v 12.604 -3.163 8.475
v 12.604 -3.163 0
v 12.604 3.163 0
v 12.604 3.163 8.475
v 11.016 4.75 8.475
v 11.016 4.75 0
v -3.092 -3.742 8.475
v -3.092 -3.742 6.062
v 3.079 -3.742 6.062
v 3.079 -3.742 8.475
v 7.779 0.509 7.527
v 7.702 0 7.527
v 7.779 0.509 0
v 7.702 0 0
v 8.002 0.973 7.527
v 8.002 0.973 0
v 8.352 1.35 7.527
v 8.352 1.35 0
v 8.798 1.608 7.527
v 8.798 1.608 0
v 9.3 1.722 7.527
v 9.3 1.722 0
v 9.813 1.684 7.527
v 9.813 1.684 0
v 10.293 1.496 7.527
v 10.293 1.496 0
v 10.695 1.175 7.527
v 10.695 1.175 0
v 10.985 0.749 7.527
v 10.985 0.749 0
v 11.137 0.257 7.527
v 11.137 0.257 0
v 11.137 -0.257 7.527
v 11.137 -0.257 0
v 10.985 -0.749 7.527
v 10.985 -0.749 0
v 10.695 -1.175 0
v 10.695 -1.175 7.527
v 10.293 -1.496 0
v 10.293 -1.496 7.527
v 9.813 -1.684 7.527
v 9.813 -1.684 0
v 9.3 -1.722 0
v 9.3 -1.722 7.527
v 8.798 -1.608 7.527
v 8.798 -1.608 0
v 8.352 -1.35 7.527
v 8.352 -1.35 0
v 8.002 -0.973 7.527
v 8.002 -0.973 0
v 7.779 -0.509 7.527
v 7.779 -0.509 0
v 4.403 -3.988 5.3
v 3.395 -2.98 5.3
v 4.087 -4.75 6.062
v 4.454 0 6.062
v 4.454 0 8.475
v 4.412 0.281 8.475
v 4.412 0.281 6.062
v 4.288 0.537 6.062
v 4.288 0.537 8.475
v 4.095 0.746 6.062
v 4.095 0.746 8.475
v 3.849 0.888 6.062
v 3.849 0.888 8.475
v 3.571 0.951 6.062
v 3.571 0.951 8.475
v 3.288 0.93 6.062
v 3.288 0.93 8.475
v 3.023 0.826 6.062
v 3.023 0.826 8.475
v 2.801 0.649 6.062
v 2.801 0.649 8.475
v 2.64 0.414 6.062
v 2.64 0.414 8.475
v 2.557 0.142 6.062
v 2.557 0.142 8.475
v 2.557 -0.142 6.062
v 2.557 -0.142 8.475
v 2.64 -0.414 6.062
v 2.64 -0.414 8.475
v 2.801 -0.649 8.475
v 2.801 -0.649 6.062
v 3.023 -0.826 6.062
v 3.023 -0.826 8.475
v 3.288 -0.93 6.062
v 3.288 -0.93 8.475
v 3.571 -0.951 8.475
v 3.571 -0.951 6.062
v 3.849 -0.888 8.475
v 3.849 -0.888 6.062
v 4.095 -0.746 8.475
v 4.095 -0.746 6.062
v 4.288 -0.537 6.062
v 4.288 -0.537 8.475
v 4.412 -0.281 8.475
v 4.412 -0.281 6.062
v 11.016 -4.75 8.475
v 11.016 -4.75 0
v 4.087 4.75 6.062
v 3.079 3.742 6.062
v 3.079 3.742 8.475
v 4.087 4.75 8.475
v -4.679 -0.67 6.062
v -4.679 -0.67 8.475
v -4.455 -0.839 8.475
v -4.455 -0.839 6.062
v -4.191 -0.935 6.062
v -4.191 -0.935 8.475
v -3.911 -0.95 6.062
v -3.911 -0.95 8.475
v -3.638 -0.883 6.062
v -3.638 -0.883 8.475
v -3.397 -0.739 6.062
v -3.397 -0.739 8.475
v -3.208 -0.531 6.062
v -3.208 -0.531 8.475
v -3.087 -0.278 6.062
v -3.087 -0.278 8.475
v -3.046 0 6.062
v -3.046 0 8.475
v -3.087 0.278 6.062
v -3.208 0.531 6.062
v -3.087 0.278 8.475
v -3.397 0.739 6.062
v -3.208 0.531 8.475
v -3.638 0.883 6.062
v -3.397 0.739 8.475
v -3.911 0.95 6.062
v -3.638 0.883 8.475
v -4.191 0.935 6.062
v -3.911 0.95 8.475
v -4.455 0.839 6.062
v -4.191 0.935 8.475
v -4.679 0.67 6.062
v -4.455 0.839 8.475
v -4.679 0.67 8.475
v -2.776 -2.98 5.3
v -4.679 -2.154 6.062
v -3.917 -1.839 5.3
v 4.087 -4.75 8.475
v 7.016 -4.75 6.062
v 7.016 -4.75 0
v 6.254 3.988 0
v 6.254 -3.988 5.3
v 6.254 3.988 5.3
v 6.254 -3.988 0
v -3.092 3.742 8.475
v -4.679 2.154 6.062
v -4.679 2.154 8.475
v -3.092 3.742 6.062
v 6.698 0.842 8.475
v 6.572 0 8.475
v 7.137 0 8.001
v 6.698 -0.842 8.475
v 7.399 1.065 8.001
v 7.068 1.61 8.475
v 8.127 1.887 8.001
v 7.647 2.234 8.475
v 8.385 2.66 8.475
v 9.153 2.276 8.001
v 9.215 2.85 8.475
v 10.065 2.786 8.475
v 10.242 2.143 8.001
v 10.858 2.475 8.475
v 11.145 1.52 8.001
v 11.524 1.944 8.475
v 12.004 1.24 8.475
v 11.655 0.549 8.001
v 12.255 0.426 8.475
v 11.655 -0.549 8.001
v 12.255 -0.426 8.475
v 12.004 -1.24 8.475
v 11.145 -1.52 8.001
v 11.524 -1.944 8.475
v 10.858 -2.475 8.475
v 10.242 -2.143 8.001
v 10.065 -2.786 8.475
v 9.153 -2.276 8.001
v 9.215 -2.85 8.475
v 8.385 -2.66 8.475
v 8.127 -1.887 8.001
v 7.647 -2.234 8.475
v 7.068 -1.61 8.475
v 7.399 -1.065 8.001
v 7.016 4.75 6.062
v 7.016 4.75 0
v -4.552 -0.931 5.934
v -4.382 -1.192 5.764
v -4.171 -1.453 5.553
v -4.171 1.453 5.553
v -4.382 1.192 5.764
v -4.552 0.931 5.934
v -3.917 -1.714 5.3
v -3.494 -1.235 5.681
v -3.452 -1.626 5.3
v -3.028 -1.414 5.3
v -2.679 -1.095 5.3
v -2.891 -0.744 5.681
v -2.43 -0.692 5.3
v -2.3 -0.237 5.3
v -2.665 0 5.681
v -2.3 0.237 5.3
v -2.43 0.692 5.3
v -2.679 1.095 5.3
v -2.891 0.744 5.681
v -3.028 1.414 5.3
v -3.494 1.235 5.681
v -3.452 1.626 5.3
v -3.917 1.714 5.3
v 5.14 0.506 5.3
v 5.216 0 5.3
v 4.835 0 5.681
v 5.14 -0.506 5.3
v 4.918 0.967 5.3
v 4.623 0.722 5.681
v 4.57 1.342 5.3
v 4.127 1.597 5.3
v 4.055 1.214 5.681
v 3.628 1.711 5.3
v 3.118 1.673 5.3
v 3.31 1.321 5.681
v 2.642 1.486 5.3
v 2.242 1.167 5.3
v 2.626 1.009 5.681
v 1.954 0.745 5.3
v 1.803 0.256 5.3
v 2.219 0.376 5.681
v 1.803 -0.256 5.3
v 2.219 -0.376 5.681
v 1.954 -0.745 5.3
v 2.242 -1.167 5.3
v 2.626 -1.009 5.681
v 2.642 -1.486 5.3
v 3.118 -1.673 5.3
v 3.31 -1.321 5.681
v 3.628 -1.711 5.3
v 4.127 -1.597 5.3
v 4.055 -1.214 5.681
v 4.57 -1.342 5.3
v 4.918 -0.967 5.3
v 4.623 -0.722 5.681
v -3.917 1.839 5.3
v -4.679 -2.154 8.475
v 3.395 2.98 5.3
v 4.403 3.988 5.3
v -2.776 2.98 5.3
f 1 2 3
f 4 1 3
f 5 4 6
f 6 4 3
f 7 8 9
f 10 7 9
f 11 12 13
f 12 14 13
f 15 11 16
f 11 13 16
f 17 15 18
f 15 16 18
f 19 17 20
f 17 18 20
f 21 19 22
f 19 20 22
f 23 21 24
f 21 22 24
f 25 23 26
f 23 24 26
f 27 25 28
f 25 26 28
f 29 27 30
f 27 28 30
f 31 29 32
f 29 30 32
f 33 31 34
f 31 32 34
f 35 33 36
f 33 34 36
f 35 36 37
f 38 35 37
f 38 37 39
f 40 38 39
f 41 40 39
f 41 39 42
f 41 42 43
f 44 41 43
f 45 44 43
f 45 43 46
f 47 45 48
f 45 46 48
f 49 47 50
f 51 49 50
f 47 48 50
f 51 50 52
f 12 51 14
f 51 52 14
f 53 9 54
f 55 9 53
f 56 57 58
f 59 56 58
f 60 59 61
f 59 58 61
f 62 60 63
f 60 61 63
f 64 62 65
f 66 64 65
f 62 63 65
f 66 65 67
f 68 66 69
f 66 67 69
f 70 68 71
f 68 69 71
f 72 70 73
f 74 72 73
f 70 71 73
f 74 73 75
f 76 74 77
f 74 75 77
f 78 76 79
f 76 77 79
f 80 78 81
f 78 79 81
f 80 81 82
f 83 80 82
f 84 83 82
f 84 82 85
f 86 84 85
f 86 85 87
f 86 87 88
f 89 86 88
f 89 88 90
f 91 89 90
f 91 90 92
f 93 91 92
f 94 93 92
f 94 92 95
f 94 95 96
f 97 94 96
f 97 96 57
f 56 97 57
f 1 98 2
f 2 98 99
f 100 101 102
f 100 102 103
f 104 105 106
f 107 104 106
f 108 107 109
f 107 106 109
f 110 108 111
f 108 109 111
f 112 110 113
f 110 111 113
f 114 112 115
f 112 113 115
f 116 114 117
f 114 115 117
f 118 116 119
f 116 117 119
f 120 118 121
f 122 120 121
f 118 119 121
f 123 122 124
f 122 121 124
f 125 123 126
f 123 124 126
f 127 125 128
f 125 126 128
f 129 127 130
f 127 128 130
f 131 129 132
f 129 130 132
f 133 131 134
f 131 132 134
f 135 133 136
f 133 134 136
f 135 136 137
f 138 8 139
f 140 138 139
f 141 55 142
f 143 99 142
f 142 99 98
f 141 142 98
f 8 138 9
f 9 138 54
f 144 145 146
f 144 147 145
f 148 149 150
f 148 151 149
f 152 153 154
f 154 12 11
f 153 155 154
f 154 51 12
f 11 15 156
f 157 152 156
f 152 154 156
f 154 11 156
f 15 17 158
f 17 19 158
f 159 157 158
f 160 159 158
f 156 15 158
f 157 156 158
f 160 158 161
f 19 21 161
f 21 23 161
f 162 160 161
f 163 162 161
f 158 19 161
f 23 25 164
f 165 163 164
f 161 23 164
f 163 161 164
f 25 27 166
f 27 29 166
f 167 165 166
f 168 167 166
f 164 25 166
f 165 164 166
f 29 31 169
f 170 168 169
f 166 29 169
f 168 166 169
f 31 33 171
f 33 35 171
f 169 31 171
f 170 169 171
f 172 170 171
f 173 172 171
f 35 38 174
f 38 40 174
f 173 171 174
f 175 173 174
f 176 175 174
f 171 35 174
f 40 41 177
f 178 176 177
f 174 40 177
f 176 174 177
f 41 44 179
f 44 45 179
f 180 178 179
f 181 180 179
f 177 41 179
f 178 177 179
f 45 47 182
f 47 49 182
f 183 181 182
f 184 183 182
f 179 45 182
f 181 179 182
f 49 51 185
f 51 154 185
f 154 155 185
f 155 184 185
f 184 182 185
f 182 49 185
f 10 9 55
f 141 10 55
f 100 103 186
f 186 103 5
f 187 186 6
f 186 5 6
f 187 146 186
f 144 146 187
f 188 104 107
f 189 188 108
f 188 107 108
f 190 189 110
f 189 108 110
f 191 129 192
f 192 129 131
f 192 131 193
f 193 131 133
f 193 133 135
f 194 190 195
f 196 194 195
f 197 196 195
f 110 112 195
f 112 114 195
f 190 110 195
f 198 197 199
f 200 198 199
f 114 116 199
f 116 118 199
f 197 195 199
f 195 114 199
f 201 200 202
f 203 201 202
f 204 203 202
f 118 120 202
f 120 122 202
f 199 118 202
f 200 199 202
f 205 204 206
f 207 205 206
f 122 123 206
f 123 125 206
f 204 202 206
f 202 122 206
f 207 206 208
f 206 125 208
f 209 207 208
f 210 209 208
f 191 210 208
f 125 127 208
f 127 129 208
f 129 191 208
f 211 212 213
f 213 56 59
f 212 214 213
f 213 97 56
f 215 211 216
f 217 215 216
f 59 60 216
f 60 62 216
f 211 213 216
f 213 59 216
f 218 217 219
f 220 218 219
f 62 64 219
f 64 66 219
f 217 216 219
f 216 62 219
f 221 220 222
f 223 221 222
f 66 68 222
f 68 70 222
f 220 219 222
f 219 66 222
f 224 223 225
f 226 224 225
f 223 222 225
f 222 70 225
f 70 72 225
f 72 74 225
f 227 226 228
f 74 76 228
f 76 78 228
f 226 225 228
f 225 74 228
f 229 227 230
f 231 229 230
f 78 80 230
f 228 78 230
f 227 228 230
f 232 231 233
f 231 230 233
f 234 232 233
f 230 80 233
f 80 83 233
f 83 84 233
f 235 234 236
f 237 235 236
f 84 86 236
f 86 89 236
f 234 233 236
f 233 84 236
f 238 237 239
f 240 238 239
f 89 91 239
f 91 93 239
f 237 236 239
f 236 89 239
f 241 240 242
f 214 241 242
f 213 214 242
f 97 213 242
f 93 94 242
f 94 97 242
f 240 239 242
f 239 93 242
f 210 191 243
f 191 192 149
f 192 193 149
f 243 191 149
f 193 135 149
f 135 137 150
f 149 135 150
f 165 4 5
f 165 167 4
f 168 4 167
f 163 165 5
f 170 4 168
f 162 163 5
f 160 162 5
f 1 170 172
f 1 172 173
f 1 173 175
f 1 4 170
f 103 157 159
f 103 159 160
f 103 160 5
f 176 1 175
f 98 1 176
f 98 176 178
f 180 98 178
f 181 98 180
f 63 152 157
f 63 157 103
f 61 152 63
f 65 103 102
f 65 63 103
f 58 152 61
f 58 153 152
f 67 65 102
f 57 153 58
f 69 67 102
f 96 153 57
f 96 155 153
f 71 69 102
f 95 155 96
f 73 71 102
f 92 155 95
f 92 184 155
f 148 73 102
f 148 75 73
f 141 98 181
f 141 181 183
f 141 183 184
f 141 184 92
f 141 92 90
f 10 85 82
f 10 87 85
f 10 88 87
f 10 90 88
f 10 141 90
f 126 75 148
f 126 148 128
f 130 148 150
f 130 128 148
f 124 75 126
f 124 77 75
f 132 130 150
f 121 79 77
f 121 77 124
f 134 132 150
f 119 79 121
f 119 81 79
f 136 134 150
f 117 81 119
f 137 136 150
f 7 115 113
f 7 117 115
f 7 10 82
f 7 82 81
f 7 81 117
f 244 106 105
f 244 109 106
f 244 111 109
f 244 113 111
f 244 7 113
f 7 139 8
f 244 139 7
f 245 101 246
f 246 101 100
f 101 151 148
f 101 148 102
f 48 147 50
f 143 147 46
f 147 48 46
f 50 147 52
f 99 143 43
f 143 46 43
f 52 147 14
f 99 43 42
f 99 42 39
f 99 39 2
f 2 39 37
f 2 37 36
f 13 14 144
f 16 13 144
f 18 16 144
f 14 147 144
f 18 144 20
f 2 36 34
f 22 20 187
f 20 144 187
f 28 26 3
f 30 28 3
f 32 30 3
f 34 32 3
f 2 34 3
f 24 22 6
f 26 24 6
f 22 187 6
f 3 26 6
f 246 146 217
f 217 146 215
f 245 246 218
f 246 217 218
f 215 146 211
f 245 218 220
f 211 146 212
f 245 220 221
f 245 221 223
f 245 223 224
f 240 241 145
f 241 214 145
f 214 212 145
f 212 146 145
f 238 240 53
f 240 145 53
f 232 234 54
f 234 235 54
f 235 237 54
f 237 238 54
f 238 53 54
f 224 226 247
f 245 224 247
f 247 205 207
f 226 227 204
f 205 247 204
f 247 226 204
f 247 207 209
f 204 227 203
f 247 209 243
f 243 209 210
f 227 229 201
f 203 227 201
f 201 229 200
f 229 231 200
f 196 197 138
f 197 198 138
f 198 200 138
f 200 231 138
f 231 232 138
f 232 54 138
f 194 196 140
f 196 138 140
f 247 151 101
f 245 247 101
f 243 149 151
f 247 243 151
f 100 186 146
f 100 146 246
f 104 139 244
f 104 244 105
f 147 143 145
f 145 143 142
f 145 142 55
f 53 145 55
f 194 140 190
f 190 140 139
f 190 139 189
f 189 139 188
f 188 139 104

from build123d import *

# Parameters (mm, degrees)
SKETCH1_W                                         = 6.35
SKETCH1_H                                         = 9.5
BOSS_EXTRUDE1_DEPTH                               = 5.3
SKETCH2_W                                         = 17.283420288
SKETCH2_H                                         = 7.484
BOSS_EXTRUDE2_DEPTH                               = 3.175
SKETCH3_R                                         = 0.954
CUT_EXTRUDE1_DEPTH                                = 16.91379719
SKETCH4_W                                         = 6.35
SKETCH4_H                                         = 1.008
BOSS_EXTRUDE3_DEPTH                               = 3.175
CHAMFER1_SIZE                                     = 3.175
CHAMFER2_SIZE                                     = 1.5875
CHAMFER3_SIZE                                     = 0.762
CSK_FOR_4_FLAT_HEAD_MACHINE_SCREW_100_D           = 3.4544
CSK_FOR_4_FLAT_HEAD_MACHINE_SCREW_100_CSINK_D     = 5.715
CSK_FOR_4_FLAT_HEAD_MACHINE_SCREW_100_CSINK_ANGLE = 100


with BuildPart() as part:
    # Sketch1 → Boss-Extrude1 (new body)
    with BuildSketch(Plane.XY):
        with Locations((9.429, 0)):
            Rectangle(SKETCH1_W, SKETCH1_H)
    extrude(amount=BOSS_EXTRUDE1_DEPTH)

    # Sketch2 → Boss-Extrude2 (add)
    with BuildSketch(Plane.XY.offset(5.3)):
        with Locations((3.962289856, 0)):
            Rectangle(SKETCH2_W, SKETCH2_H)
    extrude(amount=BOSS_EXTRUDE2_DEPTH)

    # Sketch3 → Cut-Extrude1 (cut, through all)
    with BuildSketch(Plane.XY.offset(8.475)):
        with Locations((-4, 0)):
            Circle(SKETCH3_R)
        with Locations((3.5, 0)):
            Circle(SKETCH3_R)
    extrude(amount=-CUT_EXTRUDE1_DEPTH, mode=Mode.SUBTRACT)

    # Sketch4 → Boss-Extrude3 (add)
    with BuildSketch(Plane.XY.offset(5.3)):
        with Locations((9.429, 4.246)):
            Rectangle(SKETCH4_W, SKETCH4_H)
        with Locations((9.429, -4.246)):
            Rectangle(SKETCH4_W, SKETCH4_H)
    extrude(amount=BOSS_EXTRUDE3_DEPTH)

    # Chamfer1
    # the kernel refuses this chamfer: 3.175 mm, written as the material it adds along each edge
    with BuildSketch(Plane(origin=(6.254, 3.742, 5.3), x_dir=(-0.9996219169112968, -0.027495876610586466, 0), z_dir=(0, 0, 1))) as chamfer1_piece_1_section:
        Polygon((CHAMFER1_SIZE * 0.999621916911, -CHAMFER1_SIZE * 0.0274958766106), (-CHAMFER1_SIZE * 0.0274958766106, -CHAMFER1_SIZE * 0.999621916911), (0, 0), align=None)
    chamfer1_piece_1 = extrude(amount=3.175, mode=Mode.PRIVATE)
    chamfer1_piece_1 = split(chamfer1_piece_1, bisect_by=Plane(origin=(4.881200971, 4.75, 6.8875), z_dir=(0, -1, 0)), keep=Keep.TOP, mode=Mode.PRIVATE)
    add(chamfer1_piece_1)
    with BuildSketch(Plane(origin=(6.254, -3.742, 5.3), x_dir=(-0.9996219169112968, 0.027495876610586324, 0), z_dir=(0, 0, 1))) as chamfer1_piece_2_section:
        Polygon((CHAMFER1_SIZE * 0.999621916911, CHAMFER1_SIZE * 0.0274958766106), (-CHAMFER1_SIZE * 0.0274958766106, CHAMFER1_SIZE * 0.999621916911), (0, 0), align=None)
    chamfer1_piece_2 = extrude(amount=3.175, mode=Mode.PRIVATE)
    chamfer1_piece_2 = split(chamfer1_piece_2, bisect_by=Plane(origin=(4.881200971, -4.75, 6.8875), z_dir=(0, 1, 0)), keep=Keep.TOP, mode=Mode.PRIVATE)
    add(chamfer1_piece_2)

    # Chamfer2
    chamfer2_edges = [part.edges().sort_by_distance(p)[0] for p in [
        (12.604, 4.75, 4.2375),
        (12.604, -4.75, 4.2375),
        (-4.679420288, 3.742, 6.8875),
        (-4.679420288, -3.742, 6.8875),
    ]]
    chamfer(chamfer2_edges, length=CHAMFER2_SIZE)

    # Chamfer3
    chamfer3_edges = [part.edges().sort_by_distance(p)[0] for p in [
        (-0.006460144, -3.742, 5.3),
        (-4.679420288, 1.412102233, 5.3),
        (-3.885670288, 2.94825, 5.3),
        (-3.885670288, -2.94825, 5.3),
        (-4.679420288, -1.412102233, 5.3),
        (-3.046, 0, 5.3),
        (2.546, 0, 5.3),
        (-0.006460144, 3.742, 5.3),
        (6.254, -4.75, 2.65),
        (6.254, 4.75, 2.65),
        (3.583, 4.246, 5.3),
        (3.583, -4.246, 5.3),
        (5.1705, 4.75, 5.3),
        (5.1705, -4.75, 5.3),
    ]]
    chamfer(chamfer3_edges, length=CHAMFER3_SIZE)

    # CSK for #4 Flat Head Machine Screw (100)1 (through all)
    with Locations(Plane.XY.offset(8.475)):
        with Locations((9.429, 0)):
            CounterSinkHole(CSK_FOR_4_FLAT_HEAD_MACHINE_SCREW_100_D / 2, CSK_FOR_4_FLAT_HEAD_MACHINE_SCREW_100_CSINK_D / 2, counter_sink_angle=CSK_FOR_4_FLAT_HEAD_MACHINE_SCREW_100_CSINK_ANGLE)


solid = part.part
